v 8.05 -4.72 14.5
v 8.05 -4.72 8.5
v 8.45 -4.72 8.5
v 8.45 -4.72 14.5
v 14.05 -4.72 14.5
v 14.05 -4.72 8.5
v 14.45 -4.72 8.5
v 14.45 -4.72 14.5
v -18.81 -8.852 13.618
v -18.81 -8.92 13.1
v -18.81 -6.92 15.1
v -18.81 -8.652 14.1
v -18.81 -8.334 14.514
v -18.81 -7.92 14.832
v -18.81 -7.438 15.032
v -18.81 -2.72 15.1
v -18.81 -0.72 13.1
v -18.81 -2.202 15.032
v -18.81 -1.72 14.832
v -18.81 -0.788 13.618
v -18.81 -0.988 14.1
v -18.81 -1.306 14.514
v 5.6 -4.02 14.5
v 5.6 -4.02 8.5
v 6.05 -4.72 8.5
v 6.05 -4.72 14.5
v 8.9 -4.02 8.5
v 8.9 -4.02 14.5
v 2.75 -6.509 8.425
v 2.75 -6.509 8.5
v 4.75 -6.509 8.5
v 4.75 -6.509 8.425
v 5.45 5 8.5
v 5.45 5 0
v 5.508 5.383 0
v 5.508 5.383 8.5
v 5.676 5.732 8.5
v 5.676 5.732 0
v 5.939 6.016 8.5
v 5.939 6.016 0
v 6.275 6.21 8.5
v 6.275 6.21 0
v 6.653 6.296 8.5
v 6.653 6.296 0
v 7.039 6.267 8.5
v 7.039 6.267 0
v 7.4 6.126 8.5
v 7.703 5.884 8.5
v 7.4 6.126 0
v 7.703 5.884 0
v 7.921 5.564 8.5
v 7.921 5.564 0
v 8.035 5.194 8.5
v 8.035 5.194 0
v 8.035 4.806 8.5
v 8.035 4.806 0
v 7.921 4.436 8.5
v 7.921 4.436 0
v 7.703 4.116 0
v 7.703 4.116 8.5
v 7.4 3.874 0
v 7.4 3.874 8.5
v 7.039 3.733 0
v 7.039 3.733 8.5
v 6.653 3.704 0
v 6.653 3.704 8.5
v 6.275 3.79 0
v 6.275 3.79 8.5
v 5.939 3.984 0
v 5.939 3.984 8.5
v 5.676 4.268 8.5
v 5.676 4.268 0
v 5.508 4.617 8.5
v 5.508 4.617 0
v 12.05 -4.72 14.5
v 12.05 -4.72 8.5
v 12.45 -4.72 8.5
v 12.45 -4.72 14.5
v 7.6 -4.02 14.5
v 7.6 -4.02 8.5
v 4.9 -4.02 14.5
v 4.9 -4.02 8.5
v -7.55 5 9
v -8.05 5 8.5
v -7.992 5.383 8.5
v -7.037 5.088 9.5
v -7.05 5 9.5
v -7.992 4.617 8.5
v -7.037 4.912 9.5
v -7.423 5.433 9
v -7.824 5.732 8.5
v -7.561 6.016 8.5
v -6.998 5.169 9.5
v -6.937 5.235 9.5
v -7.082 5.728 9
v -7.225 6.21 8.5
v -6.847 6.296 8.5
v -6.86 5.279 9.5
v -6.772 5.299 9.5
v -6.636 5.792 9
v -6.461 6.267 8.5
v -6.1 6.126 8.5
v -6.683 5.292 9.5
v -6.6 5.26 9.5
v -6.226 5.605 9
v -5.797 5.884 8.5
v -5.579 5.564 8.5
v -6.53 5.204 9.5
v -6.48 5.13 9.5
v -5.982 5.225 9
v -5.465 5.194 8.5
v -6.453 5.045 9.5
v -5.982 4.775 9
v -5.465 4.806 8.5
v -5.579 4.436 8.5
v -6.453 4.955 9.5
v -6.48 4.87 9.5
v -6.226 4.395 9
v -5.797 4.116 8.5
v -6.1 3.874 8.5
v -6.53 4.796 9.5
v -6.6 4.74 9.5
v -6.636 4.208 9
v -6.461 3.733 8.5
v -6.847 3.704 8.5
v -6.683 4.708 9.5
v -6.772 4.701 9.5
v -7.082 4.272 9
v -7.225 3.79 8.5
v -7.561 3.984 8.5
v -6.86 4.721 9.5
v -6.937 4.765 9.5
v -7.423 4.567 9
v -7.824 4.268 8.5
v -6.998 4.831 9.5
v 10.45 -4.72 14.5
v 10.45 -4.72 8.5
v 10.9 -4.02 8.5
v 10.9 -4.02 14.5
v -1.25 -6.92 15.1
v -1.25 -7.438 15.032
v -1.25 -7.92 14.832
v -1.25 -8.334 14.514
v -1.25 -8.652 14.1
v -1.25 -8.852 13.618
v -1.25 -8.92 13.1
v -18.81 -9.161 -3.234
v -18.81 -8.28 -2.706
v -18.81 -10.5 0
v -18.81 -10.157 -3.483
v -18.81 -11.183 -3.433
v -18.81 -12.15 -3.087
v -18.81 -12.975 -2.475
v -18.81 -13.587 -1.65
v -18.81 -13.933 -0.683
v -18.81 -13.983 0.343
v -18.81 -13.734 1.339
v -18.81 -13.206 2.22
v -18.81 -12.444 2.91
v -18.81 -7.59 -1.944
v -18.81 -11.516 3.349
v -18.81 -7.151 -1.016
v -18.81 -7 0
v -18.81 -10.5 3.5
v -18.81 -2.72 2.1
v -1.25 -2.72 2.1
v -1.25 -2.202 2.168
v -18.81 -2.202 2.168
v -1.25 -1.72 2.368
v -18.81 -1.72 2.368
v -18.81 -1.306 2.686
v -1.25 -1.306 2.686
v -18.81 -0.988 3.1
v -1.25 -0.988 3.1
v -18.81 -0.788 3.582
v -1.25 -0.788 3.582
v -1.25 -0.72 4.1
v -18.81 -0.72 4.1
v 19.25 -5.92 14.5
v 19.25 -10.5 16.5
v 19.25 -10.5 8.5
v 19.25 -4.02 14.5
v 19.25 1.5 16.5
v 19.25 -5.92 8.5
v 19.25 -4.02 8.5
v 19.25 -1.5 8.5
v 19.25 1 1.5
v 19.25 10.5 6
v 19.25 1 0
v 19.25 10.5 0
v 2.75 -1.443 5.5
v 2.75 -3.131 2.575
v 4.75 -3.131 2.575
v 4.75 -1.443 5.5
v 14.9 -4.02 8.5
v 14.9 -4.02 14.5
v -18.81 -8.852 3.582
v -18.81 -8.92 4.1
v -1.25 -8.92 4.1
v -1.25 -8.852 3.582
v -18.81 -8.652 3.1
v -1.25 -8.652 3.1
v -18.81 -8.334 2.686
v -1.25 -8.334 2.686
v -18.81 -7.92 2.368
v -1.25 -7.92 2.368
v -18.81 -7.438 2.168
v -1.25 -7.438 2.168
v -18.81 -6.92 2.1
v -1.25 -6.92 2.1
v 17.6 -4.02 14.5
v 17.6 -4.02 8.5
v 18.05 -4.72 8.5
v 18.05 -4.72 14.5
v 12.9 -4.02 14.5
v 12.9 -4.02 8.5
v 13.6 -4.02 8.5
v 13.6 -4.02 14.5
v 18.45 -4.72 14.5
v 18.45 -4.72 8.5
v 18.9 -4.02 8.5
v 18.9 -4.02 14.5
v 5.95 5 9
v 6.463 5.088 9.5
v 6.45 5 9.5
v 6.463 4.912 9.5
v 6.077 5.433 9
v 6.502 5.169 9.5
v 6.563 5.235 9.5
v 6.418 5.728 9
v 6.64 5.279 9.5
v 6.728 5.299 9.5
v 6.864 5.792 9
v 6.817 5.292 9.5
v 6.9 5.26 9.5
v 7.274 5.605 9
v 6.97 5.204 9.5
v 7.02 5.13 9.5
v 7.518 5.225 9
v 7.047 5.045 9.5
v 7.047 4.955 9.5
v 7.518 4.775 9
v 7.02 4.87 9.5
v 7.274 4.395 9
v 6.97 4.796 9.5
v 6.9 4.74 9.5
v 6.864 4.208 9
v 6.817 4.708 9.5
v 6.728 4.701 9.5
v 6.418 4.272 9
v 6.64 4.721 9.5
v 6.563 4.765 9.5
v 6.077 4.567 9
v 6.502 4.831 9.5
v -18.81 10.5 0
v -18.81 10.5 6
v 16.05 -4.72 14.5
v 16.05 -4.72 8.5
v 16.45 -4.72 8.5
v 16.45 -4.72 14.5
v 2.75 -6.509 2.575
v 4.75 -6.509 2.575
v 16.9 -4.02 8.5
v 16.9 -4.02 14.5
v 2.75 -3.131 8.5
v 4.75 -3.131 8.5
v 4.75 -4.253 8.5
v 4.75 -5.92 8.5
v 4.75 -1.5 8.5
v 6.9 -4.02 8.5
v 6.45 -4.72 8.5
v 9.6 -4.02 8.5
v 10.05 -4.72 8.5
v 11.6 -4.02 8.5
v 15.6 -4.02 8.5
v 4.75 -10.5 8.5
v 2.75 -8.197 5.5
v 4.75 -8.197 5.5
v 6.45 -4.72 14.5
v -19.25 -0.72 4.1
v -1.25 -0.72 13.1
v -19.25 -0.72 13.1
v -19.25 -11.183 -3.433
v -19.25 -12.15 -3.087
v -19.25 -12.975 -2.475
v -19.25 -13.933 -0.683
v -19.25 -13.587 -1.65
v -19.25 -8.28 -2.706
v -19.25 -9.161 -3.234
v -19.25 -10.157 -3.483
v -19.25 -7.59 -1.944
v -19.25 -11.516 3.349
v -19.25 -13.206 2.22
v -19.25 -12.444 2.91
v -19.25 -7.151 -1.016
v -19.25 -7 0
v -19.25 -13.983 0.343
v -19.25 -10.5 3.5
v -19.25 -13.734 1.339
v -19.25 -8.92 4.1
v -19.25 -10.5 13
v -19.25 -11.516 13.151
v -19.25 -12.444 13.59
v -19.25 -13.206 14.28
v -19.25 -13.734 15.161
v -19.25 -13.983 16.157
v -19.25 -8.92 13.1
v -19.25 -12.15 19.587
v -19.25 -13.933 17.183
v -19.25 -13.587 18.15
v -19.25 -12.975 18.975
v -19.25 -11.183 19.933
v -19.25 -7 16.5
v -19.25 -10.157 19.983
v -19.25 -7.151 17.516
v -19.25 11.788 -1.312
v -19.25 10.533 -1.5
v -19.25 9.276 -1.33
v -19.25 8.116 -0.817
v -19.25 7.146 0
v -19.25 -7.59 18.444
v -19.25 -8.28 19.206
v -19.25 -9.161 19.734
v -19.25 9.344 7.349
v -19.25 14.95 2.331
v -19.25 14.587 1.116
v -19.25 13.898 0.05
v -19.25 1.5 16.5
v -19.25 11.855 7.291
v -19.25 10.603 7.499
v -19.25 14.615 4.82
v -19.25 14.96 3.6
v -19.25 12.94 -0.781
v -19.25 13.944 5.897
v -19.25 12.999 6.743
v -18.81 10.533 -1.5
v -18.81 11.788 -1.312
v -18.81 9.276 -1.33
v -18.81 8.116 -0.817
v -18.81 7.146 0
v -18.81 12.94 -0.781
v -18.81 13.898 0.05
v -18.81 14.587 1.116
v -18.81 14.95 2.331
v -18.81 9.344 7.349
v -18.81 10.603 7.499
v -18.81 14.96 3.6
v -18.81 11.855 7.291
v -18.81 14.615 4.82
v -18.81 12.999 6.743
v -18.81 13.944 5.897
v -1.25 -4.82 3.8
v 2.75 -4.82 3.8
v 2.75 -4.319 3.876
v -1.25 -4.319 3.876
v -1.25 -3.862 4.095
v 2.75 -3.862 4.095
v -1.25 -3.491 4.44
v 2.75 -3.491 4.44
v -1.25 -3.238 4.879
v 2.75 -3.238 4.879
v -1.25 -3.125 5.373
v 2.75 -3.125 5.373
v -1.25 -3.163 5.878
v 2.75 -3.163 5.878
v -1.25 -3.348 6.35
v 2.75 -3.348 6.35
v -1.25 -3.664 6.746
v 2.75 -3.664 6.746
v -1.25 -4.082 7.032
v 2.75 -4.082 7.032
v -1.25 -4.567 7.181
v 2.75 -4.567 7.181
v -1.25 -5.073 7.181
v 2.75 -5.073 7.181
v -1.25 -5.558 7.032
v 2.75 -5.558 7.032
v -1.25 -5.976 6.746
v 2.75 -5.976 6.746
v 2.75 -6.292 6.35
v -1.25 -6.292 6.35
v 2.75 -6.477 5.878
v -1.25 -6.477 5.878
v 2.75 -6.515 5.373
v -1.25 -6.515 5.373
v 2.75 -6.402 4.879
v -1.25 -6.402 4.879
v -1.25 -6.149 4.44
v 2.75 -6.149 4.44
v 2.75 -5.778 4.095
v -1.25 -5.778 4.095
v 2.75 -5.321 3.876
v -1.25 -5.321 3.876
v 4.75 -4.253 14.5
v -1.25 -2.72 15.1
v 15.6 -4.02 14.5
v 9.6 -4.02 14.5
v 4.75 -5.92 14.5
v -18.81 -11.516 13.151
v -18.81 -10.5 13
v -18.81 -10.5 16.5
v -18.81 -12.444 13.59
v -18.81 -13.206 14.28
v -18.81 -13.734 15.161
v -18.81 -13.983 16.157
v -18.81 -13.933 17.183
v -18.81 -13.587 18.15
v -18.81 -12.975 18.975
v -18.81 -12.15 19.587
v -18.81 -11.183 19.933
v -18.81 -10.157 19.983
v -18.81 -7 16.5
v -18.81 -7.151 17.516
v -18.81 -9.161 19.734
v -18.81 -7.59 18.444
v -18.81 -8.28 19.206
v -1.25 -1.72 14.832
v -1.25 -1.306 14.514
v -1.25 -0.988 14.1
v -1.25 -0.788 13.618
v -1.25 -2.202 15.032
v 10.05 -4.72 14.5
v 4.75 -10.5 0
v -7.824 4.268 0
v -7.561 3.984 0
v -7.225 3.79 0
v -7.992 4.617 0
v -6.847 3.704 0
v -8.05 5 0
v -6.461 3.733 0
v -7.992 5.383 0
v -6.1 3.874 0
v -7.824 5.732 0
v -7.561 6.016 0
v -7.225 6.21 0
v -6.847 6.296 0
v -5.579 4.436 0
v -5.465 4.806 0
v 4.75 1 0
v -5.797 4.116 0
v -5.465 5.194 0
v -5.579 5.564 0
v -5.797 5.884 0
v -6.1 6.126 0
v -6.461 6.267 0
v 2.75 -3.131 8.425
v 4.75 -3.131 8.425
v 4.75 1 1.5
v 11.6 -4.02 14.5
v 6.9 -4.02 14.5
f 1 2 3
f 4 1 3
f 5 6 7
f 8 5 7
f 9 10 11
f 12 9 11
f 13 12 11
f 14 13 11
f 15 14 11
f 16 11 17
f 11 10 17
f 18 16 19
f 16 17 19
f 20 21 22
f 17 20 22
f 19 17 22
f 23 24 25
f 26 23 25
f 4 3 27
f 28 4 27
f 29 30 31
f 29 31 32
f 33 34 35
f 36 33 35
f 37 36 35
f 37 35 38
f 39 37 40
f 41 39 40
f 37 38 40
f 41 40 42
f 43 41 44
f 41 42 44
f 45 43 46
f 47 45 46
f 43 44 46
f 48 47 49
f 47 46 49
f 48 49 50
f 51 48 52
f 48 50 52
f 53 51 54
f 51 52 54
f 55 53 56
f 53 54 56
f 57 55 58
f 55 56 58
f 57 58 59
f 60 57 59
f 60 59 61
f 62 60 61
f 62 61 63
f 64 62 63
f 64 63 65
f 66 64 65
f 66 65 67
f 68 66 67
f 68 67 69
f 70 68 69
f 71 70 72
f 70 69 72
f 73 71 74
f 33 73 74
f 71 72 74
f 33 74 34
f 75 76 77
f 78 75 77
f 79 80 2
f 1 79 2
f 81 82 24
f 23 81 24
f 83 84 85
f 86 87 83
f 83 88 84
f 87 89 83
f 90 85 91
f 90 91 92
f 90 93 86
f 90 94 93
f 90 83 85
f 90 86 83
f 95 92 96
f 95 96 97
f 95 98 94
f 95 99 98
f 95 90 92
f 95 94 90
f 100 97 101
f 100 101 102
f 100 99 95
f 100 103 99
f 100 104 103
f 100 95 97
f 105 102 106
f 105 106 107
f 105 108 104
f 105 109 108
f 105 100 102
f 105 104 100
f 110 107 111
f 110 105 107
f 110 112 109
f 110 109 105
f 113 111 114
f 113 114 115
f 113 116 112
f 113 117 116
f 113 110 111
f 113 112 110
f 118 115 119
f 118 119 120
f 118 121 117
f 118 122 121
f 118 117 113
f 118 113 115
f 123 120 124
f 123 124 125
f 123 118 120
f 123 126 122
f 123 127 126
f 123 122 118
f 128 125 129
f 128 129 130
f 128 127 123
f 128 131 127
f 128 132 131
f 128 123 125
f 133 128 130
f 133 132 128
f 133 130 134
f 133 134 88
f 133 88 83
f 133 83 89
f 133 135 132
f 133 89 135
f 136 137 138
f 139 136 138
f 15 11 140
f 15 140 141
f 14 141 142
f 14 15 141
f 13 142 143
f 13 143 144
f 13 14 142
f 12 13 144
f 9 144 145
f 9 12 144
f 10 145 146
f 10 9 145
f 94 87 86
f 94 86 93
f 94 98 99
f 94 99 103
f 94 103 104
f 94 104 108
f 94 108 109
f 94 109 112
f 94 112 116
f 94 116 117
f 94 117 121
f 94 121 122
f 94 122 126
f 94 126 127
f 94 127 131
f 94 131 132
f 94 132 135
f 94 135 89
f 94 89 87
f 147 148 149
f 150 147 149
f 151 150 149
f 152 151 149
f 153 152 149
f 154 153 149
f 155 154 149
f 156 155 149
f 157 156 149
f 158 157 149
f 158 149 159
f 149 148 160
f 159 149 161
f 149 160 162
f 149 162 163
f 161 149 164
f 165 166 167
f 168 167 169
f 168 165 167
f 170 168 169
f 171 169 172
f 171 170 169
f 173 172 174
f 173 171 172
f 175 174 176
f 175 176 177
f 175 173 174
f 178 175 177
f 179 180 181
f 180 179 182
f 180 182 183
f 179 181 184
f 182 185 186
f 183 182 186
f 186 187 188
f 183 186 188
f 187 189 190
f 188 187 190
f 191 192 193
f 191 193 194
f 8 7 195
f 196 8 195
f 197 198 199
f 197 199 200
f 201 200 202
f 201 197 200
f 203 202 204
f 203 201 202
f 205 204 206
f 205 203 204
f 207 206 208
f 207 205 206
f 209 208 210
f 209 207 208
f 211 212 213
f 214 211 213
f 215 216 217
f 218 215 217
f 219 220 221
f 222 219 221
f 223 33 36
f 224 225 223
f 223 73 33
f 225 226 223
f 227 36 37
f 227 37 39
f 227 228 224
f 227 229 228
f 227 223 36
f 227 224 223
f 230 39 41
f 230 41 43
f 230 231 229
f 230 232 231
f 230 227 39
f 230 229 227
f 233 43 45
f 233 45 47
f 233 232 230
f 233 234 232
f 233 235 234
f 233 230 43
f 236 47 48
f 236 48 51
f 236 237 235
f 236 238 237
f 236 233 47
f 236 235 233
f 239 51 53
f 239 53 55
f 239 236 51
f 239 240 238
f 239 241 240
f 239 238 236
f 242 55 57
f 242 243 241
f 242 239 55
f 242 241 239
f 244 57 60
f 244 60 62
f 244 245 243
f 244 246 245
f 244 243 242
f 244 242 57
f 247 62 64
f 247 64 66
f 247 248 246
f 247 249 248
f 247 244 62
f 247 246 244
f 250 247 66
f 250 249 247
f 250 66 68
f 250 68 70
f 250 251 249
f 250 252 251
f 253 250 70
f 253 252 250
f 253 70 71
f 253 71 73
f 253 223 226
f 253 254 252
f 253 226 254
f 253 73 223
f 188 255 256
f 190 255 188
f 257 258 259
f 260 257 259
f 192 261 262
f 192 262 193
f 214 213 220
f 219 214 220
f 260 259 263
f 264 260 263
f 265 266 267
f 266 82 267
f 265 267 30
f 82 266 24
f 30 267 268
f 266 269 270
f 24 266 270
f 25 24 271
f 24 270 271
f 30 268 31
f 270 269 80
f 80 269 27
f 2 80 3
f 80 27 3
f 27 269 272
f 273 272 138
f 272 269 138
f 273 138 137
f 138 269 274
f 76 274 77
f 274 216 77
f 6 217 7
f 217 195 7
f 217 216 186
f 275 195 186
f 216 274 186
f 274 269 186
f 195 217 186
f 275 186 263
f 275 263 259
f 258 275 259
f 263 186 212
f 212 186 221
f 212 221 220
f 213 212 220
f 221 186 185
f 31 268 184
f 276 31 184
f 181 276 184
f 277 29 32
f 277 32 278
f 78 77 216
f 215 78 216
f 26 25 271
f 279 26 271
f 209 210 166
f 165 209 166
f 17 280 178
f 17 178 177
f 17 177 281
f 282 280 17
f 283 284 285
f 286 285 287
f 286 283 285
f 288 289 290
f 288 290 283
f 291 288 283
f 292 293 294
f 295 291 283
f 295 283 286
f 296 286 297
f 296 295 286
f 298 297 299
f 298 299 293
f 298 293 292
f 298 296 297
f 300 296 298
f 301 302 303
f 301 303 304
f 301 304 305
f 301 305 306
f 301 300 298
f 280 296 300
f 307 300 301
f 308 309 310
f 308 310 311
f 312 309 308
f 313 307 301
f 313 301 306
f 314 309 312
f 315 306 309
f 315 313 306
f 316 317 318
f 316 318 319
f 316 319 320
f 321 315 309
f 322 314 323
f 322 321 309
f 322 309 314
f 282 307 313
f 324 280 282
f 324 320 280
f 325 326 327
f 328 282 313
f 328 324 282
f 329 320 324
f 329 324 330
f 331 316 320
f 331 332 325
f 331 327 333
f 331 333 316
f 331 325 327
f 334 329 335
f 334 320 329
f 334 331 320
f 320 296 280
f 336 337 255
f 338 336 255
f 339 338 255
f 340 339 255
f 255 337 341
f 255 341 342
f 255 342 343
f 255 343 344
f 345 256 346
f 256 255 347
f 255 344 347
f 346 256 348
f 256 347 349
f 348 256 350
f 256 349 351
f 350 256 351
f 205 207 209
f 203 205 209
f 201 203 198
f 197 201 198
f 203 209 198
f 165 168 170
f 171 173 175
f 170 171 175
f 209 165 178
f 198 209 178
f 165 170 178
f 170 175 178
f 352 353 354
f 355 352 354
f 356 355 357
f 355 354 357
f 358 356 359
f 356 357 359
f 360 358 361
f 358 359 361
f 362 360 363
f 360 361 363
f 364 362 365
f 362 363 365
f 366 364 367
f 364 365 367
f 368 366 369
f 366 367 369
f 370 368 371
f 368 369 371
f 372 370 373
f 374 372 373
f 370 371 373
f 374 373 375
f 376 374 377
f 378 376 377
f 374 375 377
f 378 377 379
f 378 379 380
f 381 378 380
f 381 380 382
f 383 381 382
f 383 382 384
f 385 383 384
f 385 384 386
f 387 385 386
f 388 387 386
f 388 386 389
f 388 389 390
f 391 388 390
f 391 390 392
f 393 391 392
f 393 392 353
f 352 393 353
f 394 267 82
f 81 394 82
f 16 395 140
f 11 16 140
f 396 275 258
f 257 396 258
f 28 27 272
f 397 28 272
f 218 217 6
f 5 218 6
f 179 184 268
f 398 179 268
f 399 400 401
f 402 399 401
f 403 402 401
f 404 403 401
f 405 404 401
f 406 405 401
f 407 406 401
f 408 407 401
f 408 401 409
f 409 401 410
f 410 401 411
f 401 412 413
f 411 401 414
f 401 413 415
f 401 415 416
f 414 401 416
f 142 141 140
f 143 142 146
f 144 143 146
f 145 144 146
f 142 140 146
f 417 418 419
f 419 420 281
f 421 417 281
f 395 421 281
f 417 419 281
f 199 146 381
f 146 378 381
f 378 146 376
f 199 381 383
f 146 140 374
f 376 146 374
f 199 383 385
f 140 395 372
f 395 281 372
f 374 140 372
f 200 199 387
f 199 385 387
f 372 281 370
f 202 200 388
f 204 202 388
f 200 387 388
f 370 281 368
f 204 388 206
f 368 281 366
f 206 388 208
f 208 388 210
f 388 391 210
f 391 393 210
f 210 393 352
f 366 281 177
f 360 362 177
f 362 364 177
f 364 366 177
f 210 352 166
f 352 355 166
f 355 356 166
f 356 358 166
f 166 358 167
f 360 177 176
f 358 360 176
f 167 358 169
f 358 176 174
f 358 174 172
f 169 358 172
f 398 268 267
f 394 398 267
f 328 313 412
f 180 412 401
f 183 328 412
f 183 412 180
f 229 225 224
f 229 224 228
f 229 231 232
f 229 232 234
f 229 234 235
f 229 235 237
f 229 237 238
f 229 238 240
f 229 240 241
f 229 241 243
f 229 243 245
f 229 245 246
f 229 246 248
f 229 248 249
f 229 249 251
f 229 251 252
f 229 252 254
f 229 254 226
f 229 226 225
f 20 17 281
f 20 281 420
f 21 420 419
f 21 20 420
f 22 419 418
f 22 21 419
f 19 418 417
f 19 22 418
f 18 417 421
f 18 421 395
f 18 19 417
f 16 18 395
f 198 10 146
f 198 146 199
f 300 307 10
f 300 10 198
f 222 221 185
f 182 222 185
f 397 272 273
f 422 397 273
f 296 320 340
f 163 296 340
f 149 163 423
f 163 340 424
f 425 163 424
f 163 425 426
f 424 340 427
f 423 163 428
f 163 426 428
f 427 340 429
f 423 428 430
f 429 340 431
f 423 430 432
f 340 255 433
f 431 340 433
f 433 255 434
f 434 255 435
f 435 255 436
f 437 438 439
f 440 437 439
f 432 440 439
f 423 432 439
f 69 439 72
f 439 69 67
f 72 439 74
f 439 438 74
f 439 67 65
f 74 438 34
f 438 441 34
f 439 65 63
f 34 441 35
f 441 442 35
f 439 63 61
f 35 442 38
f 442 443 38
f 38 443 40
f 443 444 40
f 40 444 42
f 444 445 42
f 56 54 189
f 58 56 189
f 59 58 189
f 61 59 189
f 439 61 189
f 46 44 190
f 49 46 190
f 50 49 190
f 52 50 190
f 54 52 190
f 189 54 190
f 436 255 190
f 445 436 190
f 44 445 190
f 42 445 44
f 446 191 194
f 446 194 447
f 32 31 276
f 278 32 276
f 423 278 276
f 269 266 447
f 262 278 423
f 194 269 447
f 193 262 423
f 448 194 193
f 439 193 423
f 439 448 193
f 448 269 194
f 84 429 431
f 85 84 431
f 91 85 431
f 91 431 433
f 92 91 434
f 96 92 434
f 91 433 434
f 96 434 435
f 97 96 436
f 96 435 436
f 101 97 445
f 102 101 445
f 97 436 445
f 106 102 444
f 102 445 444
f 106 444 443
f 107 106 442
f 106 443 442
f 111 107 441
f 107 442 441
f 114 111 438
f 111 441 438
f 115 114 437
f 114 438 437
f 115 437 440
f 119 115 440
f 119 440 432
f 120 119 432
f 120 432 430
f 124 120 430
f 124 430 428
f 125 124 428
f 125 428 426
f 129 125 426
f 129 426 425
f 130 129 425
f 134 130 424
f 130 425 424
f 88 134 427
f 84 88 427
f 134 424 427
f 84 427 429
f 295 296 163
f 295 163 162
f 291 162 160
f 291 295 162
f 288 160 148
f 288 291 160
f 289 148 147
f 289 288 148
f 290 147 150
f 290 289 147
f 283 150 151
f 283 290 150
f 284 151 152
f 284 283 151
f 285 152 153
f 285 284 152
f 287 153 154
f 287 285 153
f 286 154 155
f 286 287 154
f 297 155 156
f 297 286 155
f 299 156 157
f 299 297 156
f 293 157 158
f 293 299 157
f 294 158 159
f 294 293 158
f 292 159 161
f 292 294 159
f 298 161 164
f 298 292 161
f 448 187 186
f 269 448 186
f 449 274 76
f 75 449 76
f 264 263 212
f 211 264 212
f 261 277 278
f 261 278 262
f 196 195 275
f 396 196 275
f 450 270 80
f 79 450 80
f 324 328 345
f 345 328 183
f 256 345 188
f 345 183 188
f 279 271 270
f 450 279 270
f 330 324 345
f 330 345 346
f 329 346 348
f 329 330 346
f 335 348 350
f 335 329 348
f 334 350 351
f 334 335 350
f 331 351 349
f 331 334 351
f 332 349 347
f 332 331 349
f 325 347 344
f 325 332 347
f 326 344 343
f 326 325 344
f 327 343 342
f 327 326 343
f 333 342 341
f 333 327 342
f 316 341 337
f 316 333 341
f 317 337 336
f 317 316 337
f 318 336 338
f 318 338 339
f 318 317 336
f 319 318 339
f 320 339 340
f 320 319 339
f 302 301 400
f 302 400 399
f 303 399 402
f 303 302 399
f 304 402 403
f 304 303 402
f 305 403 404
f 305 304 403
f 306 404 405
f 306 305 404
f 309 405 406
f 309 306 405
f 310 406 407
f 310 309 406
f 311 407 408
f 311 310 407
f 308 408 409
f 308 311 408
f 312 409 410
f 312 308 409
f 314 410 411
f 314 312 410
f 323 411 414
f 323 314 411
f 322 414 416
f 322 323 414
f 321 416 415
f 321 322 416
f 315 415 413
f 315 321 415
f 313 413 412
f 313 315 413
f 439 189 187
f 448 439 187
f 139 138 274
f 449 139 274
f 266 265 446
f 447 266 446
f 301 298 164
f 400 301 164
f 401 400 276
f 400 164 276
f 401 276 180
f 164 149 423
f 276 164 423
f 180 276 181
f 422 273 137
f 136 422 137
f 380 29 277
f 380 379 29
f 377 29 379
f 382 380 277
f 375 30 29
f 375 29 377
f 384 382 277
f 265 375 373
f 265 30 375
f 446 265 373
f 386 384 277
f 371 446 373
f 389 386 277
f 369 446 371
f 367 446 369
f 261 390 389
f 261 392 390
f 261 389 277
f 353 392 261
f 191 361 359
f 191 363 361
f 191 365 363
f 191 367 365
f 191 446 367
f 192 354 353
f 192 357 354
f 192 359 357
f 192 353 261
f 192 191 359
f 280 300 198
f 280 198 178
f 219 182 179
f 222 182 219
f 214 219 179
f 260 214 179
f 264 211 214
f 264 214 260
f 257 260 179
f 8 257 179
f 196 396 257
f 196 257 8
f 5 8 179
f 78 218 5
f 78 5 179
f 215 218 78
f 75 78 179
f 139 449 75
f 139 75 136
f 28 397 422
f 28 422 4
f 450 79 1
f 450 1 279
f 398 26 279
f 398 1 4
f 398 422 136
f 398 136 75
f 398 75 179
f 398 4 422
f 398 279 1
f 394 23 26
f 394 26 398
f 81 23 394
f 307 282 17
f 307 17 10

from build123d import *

# Parameters (mm, degrees)
SKETCH1_W           = 38.5
SKETCH1_H           = 21
BOSS_EXTRUDE1_DEPTH = 16.5
SKETCH2_R           = 1.7
CUT_EXTRUDE1_DEPTH  = 38.5
SKETCH2_5_R         = 1.7
SKETCH2_5_W         = 0.075
SKETCH2_5_H         = 3.377499074
SKETCH2_5_W_2       = 1.5
SKETCH2_5_H_2       = 4
CUT_EXTRUDE2_DEPTH  = 14.5
CUT_EXTRUDE3_START  = -16.5
SKETCH2_6_R         = 1.7
SKETCH2_6_W         = 0.075
SKETCH2_6_H         = 3.377499074
CUT_EXTRUDE3_DEPTH  = 2
CUT_EXTRUDE4_DEPTH  = 18
SKETCH4_R           = 1.3
CUT_EXTRUDE5_DEPTH  = 9.5
CUT_EXTRUDE7_DEPTH  = 6
CHAMFER3_SIZE       = 1
BOSS_EXTRUDE2_DEPTH = 0.44


with BuildPart() as part:
    # Sketch1 → Boss-Extrude1 (new body)
    with BuildSketch(Plane.XY):
        Rectangle(SKETCH1_W, SKETCH1_H)
    extrude(amount=BOSS_EXTRUDE1_DEPTH)

    # Sketch2 → Cut-Extrude1 (cut)
    with BuildSketch(Plane(origin=(19.25, 0, 0), x_dir=(0, 0, -1), z_dir=(1, 0, 0))):
        Polygon((-16.5, 10.5), (-16.5, 1.5), (-6, 10.5), align=None)
        with Locations((-5.5, -4.82)):
            Circle(SKETCH2_R)
    extrude(amount=-CUT_EXTRUDE1_DEPTH, mode=Mode.SUBTRACT)

    # Sketch2<5> → Cut-Extrude2 (cut)
    with BuildSketch(Plane(origin=(19.25, 0, 0), x_dir=(0, 0, -1), z_dir=(1, 0, 0))):
        Polygon((-8.5, -6.508749537), (-8.5, -10.5), (-1.5, -10.5), (-1.5, -6.5), (0, -6.5), (0, 1), (-1.5, 1), (-8.5, -1.5), (-8.5, -3.131250463), (-8.425, -3.131250463), (-5.5, -1.442500925), (-2.575, -3.131250463), (-2.575, -6.508749537), (-5.5, -8.197499075), (-8.425, -6.508749537), align=None)
        Polygon((-8.425, -6.508749537), (-5.5, -8.197499075), (-2.575, -6.508749537), (-2.575, -3.131250463), (-5.5, -1.442500925), (-8.425, -3.131250463), align=None)
        with Locations((-5.5, -4.82)):
            Circle(SKETCH2_5_R, mode=Mode.SUBTRACT)
        with Locations((-8.4625, -4.82)):
            Rectangle(SKETCH2_5_W, SKETCH2_5_H)
        with Locations((-0.75, -8.5)):
            Rectangle(SKETCH2_5_W_2, SKETCH2_5_H_2)
    extrude(amount=-CUT_EXTRUDE2_DEPTH, mode=Mode.SUBTRACT)

    # Sketch2<6> → Cut-Extrude3 (cut)
    with BuildSketch(Plane(origin=(19.25, 0, 0), x_dir=(0, 0, -1), z_dir=(1, 0, 0)).offset(CUT_EXTRUDE3_START)):
        Polygon((-8.425, -6.508749537), (-5.5, -8.197499075), (-2.575, -6.508749537), (-2.575, -3.131250463), (-5.5, -1.442500925), (-8.425, -3.131250463), align=None)
        with Locations((-5.5, -4.82)):
            Circle(SKETCH2_6_R, mode=Mode.SUBTRACT)
        with Locations((-5.5, -4.82)):
            Circle(SKETCH2_6_R)
        with Locations((-8.4625, -4.82)):
            Rectangle(SKETCH2_6_W, SKETCH2_6_H)
    extrude(amount=CUT_EXTRUDE3_DEPTH, mode=Mode.SUBTRACT)

    # Sketch3 → Cut-Extrude4 (cut)
    with BuildSketch(Plane.ZY.offset(19.25)):
        with BuildLine():
            Line((13.1, -8.92), (4.1, -8.92))
            ThreePointArc((4.1, -8.92), (2.685786438, -8.334213562), (2.1, -6.92))
            Line((2.1, -6.92), (2.1, -2.72))
            ThreePointArc((2.1, -2.72), (2.685786438, -1.305786438), (4.1, -0.72))
            Line((4.1, -0.72), (13.1, -0.72))
            ThreePointArc((13.1, -0.72), (14.514213562, -1.305786438), (15.1, -2.72))
            Line((15.1, -2.72), (15.1, -6.92))
            ThreePointArc((15.1, -6.92), (14.514213562, -8.334213562), (13.1, -8.92))
        make_face()
    extrude(amount=-CUT_EXTRUDE4_DEPTH, mode=Mode.SUBTRACT)

    # Sketch4 → Cut-Extrude5 (cut)
    with BuildSketch(Plane(origin=(0, 0, 0), x_dir=(-1, 0, 0), z_dir=(0, 0, -1))):
        with Locations((-6.75, 5)):
            Circle(SKETCH4_R)
        with Locations((6.75, 5)):
            Circle(SKETCH4_R)
    extrude(amount=-CUT_EXTRUDE5_DEPTH, mode=Mode.SUBTRACT)

    # Sketch5 → Cut-Extrude7 (cut)
    with BuildSketch(Plane(origin=(0, 0, 8.5), x_dir=(-1, 0, 0), z_dir=(0, 0, -1))):
        Polygon((-20.249996698, -5.92), (-4.75, -5.92), (-4.75, -4.253375074), (-4.90002704, -4.02), (-5.600019193, -4.02), (-6.050019814, -4.72), (-6.250019814, -4.72), (-6.450023117, -4.72), (-6.900023738, -4.02), (-7.600015891, -4.02), (-8.050016512, -4.72), (-8.250016512, -4.72), (-8.450019814, -4.72), (-8.900020436, -4.02), (-9.600012588, -4.02), (-10.05001321, -4.72), (-10.25001321, -4.72), (-10.450016512, -4.72), (-10.900017133, -4.02), (-11.600009286, -4.02), (-12.050009907, -4.72), (-12.250009907, -4.72), (-12.45001321, -4.72), (-12.900013831, -4.02), (-13.600005984, -4.02), (-14.050006605, -4.72), (-14.250006605, -4.72), (-14.450009907, -4.72), (-14.900010528, -4.02), (-15.600002681, -4.02), (-16.050003302, -4.72), (-16.250003302, -4.72), (-16.450006605, -4.72), (-16.900007226, -4.02), (-17.599999379, -4.02), (-18.05, -4.72), (-18.250003302, -4.72), (-18.450003302, -4.72), (-18.900003924, -4.02), (-19.599996076, -4.02), (-20.049996698, -4.72), (-20.249996698, -4.72), align=None)
    extrude(amount=-CUT_EXTRUDE7_DEPTH, mode=Mode.SUBTRACT)

    # Chamfer3
    chamfer3_edges = [part.edges().sort_by_distance(p)[0] for p in [
        (8.05, 5, 9.5),
        (-5.45, 5, 9.5),
    ]]
    chamfer(chamfer3_edges, length=CHAMFER3_SIZE)

    # Sketch6 → Boss-Extrude2 (add)
    with BuildSketch(Plane.ZY.offset(19.25)):
        with BuildLine():
            Line((4.1, -8.92), (4.1, -0.72))
            ThreePointArc((4.1, -0.72), (2.685786438, -1.305786438), (2.1, -2.72))
            Line((2.1, -2.72), (2.1, -6.92))
            ThreePointArc((2.1, -6.92), (2.685786438, -8.334213562), (4.1, -8.92))
        make_face()
        with BuildLine():
            ThreePointArc((15.1, -2.72), (14.514213562, -1.305786438), (13.1, -0.72))
            Line((13.1, -0.72), (13.1, -8.92))
            ThreePointArc((13.1, -8.92), (14.514213562, -8.334213562), (15.1, -6.92))
            Line((15.1, -6.92), (15.1, -2.72))
        make_face()
        with BuildLine():
            Line((16.5, -10.5), (13, -10.5))
            ThreePointArc((13, -10.5), (18.974873734, -12.974873734), (16.5, -7))
            Line((16.5, -7), (16.5, -10.5))
        make_face()
        with BuildLine():
            ThreePointArc((0, -7), (-2.474873734, -12.974873734), (3.5, -10.5))
            Line((3.5, -10.5), (0, -10.5))
            Line((0, -10.5), (0, -7))
        make_face()
        with BuildLine():
            ThreePointArc((7.348925314, 9.343778302), (1.710593433, 14.811314267), (0, 7.145898034))
            Line((0, 7.145898034), (0, 10.5))
            Line((0, 10.5), (6, 10.5))
            Line((6, 10.5), (7.348925314, 9.343778302))
        make_face()
    extrude(amount=-BOSS_EXTRUDE2_DEPTH)


solid = part.part
